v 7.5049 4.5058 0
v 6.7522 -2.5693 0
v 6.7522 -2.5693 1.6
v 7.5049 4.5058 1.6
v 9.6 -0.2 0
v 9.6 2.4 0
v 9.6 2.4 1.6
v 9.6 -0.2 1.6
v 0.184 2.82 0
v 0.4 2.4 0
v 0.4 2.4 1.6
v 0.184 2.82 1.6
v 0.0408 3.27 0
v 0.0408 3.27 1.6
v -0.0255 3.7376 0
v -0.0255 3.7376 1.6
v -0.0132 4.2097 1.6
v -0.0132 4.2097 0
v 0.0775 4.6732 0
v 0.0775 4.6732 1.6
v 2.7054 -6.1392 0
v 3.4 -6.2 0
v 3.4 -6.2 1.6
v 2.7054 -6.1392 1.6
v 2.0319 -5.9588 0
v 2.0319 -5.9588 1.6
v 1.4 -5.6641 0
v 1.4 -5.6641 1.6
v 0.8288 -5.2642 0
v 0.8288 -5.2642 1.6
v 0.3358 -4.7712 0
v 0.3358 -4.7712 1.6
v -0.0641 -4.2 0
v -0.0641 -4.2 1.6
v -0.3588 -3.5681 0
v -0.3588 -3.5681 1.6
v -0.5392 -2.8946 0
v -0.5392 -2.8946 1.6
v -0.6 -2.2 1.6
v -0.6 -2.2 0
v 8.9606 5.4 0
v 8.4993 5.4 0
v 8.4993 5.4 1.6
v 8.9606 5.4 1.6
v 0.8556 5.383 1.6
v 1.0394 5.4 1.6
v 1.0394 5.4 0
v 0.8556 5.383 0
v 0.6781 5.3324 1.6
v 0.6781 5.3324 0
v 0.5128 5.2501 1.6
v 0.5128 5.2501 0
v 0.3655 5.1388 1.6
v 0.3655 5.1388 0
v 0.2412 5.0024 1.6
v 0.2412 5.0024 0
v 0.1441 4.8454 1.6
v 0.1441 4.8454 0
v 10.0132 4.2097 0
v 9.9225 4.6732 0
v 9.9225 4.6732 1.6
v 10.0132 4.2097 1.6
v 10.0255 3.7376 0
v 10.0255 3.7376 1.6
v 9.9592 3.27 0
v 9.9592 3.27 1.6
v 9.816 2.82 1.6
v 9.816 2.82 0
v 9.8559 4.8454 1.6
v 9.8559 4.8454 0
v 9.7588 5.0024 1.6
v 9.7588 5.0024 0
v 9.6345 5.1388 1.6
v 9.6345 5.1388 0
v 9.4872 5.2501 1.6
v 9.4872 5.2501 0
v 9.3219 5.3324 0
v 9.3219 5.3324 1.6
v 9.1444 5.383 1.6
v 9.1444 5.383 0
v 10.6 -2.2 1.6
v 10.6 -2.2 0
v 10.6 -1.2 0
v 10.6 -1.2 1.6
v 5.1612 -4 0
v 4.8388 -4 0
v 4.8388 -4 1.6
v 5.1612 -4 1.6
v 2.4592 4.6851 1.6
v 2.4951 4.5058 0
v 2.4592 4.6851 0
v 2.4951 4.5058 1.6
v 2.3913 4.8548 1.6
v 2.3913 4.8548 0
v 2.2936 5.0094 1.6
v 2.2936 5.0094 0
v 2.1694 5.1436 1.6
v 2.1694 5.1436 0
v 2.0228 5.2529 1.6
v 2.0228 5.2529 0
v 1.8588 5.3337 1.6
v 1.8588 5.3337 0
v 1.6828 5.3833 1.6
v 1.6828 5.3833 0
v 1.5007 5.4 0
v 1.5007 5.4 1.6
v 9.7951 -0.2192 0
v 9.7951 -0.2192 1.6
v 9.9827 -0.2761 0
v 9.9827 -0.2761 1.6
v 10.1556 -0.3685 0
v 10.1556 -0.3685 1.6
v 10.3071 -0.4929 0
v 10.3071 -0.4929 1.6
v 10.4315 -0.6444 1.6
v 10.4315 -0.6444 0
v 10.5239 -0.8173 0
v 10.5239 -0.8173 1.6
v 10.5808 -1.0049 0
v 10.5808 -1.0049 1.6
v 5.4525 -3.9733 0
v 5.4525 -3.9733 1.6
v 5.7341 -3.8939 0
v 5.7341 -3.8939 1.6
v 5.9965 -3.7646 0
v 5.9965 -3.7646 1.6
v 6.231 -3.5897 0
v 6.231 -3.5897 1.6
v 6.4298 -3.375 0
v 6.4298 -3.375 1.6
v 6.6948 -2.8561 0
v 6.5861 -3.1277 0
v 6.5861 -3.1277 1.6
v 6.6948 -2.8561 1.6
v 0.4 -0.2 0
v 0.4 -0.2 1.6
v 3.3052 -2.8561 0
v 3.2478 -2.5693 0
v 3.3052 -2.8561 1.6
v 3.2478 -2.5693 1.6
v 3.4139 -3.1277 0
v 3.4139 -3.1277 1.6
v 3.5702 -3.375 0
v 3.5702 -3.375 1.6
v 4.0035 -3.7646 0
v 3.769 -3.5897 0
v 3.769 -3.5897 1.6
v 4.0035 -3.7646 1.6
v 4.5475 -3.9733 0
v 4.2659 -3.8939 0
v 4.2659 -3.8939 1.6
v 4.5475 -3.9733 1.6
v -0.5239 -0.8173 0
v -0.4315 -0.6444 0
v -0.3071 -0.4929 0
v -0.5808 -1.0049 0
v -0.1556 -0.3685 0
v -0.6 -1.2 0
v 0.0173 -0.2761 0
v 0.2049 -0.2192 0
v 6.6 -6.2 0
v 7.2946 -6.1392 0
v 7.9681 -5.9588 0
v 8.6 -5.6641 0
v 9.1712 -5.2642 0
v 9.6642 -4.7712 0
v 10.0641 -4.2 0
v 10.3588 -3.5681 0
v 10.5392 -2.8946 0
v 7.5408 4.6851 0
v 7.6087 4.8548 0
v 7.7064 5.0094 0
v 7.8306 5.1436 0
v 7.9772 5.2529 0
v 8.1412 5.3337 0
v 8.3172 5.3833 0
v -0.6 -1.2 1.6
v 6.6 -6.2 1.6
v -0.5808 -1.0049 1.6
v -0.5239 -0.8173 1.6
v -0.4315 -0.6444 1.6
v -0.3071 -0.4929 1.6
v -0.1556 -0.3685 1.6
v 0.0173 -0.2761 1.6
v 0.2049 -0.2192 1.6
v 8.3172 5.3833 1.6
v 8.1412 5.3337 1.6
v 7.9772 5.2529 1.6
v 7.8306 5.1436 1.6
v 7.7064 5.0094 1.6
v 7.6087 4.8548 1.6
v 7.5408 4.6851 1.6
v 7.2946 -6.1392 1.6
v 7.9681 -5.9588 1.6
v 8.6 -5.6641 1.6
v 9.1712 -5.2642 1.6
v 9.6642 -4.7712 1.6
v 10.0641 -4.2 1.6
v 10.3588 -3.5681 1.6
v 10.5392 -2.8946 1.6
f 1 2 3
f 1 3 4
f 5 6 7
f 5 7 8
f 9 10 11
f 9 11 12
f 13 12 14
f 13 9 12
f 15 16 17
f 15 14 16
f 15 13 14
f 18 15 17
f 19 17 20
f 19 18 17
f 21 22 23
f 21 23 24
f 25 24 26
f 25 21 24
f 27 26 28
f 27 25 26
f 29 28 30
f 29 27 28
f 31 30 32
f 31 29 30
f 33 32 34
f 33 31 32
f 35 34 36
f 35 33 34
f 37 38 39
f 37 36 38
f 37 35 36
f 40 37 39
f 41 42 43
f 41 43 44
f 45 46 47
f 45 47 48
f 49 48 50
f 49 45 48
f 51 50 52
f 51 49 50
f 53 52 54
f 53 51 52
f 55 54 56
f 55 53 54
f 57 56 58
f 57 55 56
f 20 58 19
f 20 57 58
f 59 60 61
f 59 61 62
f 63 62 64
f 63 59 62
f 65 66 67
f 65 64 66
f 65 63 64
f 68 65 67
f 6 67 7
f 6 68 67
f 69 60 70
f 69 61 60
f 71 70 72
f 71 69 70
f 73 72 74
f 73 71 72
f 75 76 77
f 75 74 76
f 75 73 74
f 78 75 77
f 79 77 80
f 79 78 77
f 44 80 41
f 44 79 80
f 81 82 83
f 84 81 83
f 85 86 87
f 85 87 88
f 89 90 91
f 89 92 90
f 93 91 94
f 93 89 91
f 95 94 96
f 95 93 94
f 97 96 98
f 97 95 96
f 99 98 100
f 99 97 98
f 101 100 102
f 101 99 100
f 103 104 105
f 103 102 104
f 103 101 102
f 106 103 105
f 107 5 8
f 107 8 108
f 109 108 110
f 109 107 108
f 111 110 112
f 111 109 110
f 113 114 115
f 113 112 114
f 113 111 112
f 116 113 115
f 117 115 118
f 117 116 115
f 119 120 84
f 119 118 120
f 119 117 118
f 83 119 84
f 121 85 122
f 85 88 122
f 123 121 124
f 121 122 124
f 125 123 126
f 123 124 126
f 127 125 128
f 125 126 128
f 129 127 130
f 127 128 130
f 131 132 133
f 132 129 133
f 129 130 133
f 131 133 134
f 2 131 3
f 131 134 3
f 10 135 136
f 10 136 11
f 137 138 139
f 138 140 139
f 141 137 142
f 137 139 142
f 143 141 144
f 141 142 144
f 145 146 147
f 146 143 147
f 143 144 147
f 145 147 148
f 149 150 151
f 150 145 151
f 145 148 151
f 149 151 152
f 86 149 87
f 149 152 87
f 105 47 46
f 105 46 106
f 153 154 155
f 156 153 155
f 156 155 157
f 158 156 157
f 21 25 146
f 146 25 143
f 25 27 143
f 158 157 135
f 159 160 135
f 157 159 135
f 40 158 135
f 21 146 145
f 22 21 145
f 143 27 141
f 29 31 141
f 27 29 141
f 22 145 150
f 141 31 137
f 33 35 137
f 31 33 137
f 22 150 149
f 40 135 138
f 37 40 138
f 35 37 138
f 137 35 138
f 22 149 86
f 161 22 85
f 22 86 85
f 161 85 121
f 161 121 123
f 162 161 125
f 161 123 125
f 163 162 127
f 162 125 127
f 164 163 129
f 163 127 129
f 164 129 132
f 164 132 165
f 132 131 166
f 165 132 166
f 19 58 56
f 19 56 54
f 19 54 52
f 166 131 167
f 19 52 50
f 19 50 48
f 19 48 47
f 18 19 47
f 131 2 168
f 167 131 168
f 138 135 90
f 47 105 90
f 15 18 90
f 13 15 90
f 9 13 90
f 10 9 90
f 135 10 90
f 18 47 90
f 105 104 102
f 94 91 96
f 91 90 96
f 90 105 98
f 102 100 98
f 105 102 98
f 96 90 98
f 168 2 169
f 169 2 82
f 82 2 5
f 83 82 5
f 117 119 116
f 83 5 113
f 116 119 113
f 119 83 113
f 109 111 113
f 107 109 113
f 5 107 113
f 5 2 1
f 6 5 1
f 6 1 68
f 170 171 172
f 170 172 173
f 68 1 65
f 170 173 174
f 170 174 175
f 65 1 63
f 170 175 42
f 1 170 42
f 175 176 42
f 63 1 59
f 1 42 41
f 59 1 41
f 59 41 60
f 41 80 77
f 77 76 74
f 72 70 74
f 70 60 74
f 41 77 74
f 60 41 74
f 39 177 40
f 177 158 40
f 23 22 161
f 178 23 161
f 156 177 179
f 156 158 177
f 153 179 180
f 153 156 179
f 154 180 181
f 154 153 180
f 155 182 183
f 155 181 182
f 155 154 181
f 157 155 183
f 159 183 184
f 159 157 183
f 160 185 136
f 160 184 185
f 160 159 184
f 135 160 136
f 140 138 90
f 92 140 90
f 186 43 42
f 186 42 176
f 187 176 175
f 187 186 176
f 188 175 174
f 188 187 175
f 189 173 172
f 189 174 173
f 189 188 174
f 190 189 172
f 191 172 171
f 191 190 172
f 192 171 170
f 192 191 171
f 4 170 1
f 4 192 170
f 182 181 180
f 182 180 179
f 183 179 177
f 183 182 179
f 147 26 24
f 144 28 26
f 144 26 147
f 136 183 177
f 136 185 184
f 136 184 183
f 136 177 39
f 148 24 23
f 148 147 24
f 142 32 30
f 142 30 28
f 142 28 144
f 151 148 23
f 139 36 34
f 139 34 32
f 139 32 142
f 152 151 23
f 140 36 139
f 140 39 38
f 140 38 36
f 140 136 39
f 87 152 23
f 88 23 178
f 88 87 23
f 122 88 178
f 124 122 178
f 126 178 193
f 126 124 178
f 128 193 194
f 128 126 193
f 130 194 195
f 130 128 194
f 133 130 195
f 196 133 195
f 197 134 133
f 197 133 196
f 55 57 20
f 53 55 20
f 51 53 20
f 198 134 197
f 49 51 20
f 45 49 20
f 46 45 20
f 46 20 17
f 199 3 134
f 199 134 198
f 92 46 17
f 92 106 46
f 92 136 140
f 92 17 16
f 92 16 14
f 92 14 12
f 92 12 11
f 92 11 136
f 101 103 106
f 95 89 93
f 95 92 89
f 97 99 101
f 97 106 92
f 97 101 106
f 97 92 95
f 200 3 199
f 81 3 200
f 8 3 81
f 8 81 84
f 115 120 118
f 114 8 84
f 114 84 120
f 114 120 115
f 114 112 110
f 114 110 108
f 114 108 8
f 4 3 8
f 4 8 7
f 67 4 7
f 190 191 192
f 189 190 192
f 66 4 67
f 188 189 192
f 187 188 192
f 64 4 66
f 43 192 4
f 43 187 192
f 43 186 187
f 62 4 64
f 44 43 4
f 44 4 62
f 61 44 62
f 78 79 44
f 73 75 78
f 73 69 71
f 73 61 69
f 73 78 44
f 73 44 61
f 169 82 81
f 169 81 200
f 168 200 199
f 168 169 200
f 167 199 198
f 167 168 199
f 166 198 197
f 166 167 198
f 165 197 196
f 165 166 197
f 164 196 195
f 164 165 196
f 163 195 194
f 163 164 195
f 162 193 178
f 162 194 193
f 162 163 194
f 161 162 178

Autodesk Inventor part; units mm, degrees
ref_plane "YZ Plane" through (0, 0, 0) normal (1, 0, 0) x (0, 1, 0)
ref_plane "XZ Plane" through (0, 0, 0) normal (0, 1, 0) x (-1, 0, 0)
sketch "clip_sketch" plane through (0, 0, 0) normal (0, 0, 1) x (1, 0, 0)
  line L0 (0.2, -0.2) -> (9.8, -0.2) projected
  line L1 (9.8, -0.2) -> (9.8, 2.4) projected
  line L2 (0.2, 2.4) -> (9.8, 2.4) projected
  line L3 (0.2, -0.2) -> (0.2, 2.4) projected
  line L4 (0.4, -0.2) -> (0.4, 2.4)
  line L5 (9.6, 2.4) -> (9.6, -0.2)
  line L6 (0.4, -0.2) -> (0.4, -0.2)
  line L7 (-0.6, -1.2) -> (-0.6, -2.2)
  line L8 (3.4, -6.2) -> (6.6, -6.2)
  line L9 (10.6, -2.2) -> (10.6, -1.2)
  line L10 (9.6, -0.2) -> (9.6, -0.2)
  line L11 (0.4, 2.4) -> (0.4, 5.4)
  line L12 (0.4, 5.4) -> (9.6, 5.4)
  line L13 (9.6, 5.4) -> (9.6, 2.4)
  line L14 (3.4, -4) -> (2.4, 5.4)
  line L15 (6.6, -4) -> (7.6, 5.4)
  arc A0 (0.4, 5.4) -> (0.4, 2.4) centre (2.8, 3.9) ccw
  arc A1 (9.6, 2.4) -> (9.6, 5.4) centre (7.2, 3.9) ccw
  line L16 (5, 2.4) -> (5, -0.2) construction
  arc A2 (0.4, -0.2) -> (-0.6, -1.2) centre (0.4, -1.2) ccw
  arc A3 (10.6, -1.2) -> (9.6, -0.2) centre (9.6, -1.2) ccw
  arc A4 (-0.6, -2.2) -> (3.4, -6.2) centre (3.4, -2.2) ccw
  arc A5 (6.6, -6.2) -> (10.6, -2.2) centre (6.6, -2.2) ccw
  line L17 (3.4, -4) -> (6.6, -4)
  point P0 (0, 0)
  point P1 (-0.6, -0.2)
  dimension "d31" = 0.2
  dimension "d32" = 0.2
  dimension "d33" = 1
  dimension "d34" = 1
  dimension "d35" = 6
  dimension "d36" = 2
  dimension "d37" = 2
  dimension "d39" = 4.4
  dimension "d40" = 4.4
  dimension "d41" = 3
  dimension "d42" = 1
  dimension "d43" = 4
  dimension "d44" = 2.2
  dimension "d45" = 1
ref_plane "Work Plane1" through (0.2, -0.2, 2) normal (0, 0, -1) x (0, 1, 0)
extrude "clip" add sketch "clip_sketch" along normal blind 1.6 contours L4 L2 L14 L0 | L0 L14 L17 L15 A3 L9 A5 L8 A4 L7 A2 | L11 L12 L14 L2 | A0 L11 | L15 L2 L5 L0 | L15 L12 L13 L2 | L13 A1
fillet "teeth" radius 1 4 edges at (2.4, 5.4, 0.8) (7.6, 5.4, 0.8) (0.4, 5.4, 0.8) (9.6, 5.4, 0.8)
fillet "inside" radius 1.6 2 edges at (3.4, -4, 0.8) (6.6, -4, 0.8)
properties part number "fastener_lock" material "ABS Plastic"
